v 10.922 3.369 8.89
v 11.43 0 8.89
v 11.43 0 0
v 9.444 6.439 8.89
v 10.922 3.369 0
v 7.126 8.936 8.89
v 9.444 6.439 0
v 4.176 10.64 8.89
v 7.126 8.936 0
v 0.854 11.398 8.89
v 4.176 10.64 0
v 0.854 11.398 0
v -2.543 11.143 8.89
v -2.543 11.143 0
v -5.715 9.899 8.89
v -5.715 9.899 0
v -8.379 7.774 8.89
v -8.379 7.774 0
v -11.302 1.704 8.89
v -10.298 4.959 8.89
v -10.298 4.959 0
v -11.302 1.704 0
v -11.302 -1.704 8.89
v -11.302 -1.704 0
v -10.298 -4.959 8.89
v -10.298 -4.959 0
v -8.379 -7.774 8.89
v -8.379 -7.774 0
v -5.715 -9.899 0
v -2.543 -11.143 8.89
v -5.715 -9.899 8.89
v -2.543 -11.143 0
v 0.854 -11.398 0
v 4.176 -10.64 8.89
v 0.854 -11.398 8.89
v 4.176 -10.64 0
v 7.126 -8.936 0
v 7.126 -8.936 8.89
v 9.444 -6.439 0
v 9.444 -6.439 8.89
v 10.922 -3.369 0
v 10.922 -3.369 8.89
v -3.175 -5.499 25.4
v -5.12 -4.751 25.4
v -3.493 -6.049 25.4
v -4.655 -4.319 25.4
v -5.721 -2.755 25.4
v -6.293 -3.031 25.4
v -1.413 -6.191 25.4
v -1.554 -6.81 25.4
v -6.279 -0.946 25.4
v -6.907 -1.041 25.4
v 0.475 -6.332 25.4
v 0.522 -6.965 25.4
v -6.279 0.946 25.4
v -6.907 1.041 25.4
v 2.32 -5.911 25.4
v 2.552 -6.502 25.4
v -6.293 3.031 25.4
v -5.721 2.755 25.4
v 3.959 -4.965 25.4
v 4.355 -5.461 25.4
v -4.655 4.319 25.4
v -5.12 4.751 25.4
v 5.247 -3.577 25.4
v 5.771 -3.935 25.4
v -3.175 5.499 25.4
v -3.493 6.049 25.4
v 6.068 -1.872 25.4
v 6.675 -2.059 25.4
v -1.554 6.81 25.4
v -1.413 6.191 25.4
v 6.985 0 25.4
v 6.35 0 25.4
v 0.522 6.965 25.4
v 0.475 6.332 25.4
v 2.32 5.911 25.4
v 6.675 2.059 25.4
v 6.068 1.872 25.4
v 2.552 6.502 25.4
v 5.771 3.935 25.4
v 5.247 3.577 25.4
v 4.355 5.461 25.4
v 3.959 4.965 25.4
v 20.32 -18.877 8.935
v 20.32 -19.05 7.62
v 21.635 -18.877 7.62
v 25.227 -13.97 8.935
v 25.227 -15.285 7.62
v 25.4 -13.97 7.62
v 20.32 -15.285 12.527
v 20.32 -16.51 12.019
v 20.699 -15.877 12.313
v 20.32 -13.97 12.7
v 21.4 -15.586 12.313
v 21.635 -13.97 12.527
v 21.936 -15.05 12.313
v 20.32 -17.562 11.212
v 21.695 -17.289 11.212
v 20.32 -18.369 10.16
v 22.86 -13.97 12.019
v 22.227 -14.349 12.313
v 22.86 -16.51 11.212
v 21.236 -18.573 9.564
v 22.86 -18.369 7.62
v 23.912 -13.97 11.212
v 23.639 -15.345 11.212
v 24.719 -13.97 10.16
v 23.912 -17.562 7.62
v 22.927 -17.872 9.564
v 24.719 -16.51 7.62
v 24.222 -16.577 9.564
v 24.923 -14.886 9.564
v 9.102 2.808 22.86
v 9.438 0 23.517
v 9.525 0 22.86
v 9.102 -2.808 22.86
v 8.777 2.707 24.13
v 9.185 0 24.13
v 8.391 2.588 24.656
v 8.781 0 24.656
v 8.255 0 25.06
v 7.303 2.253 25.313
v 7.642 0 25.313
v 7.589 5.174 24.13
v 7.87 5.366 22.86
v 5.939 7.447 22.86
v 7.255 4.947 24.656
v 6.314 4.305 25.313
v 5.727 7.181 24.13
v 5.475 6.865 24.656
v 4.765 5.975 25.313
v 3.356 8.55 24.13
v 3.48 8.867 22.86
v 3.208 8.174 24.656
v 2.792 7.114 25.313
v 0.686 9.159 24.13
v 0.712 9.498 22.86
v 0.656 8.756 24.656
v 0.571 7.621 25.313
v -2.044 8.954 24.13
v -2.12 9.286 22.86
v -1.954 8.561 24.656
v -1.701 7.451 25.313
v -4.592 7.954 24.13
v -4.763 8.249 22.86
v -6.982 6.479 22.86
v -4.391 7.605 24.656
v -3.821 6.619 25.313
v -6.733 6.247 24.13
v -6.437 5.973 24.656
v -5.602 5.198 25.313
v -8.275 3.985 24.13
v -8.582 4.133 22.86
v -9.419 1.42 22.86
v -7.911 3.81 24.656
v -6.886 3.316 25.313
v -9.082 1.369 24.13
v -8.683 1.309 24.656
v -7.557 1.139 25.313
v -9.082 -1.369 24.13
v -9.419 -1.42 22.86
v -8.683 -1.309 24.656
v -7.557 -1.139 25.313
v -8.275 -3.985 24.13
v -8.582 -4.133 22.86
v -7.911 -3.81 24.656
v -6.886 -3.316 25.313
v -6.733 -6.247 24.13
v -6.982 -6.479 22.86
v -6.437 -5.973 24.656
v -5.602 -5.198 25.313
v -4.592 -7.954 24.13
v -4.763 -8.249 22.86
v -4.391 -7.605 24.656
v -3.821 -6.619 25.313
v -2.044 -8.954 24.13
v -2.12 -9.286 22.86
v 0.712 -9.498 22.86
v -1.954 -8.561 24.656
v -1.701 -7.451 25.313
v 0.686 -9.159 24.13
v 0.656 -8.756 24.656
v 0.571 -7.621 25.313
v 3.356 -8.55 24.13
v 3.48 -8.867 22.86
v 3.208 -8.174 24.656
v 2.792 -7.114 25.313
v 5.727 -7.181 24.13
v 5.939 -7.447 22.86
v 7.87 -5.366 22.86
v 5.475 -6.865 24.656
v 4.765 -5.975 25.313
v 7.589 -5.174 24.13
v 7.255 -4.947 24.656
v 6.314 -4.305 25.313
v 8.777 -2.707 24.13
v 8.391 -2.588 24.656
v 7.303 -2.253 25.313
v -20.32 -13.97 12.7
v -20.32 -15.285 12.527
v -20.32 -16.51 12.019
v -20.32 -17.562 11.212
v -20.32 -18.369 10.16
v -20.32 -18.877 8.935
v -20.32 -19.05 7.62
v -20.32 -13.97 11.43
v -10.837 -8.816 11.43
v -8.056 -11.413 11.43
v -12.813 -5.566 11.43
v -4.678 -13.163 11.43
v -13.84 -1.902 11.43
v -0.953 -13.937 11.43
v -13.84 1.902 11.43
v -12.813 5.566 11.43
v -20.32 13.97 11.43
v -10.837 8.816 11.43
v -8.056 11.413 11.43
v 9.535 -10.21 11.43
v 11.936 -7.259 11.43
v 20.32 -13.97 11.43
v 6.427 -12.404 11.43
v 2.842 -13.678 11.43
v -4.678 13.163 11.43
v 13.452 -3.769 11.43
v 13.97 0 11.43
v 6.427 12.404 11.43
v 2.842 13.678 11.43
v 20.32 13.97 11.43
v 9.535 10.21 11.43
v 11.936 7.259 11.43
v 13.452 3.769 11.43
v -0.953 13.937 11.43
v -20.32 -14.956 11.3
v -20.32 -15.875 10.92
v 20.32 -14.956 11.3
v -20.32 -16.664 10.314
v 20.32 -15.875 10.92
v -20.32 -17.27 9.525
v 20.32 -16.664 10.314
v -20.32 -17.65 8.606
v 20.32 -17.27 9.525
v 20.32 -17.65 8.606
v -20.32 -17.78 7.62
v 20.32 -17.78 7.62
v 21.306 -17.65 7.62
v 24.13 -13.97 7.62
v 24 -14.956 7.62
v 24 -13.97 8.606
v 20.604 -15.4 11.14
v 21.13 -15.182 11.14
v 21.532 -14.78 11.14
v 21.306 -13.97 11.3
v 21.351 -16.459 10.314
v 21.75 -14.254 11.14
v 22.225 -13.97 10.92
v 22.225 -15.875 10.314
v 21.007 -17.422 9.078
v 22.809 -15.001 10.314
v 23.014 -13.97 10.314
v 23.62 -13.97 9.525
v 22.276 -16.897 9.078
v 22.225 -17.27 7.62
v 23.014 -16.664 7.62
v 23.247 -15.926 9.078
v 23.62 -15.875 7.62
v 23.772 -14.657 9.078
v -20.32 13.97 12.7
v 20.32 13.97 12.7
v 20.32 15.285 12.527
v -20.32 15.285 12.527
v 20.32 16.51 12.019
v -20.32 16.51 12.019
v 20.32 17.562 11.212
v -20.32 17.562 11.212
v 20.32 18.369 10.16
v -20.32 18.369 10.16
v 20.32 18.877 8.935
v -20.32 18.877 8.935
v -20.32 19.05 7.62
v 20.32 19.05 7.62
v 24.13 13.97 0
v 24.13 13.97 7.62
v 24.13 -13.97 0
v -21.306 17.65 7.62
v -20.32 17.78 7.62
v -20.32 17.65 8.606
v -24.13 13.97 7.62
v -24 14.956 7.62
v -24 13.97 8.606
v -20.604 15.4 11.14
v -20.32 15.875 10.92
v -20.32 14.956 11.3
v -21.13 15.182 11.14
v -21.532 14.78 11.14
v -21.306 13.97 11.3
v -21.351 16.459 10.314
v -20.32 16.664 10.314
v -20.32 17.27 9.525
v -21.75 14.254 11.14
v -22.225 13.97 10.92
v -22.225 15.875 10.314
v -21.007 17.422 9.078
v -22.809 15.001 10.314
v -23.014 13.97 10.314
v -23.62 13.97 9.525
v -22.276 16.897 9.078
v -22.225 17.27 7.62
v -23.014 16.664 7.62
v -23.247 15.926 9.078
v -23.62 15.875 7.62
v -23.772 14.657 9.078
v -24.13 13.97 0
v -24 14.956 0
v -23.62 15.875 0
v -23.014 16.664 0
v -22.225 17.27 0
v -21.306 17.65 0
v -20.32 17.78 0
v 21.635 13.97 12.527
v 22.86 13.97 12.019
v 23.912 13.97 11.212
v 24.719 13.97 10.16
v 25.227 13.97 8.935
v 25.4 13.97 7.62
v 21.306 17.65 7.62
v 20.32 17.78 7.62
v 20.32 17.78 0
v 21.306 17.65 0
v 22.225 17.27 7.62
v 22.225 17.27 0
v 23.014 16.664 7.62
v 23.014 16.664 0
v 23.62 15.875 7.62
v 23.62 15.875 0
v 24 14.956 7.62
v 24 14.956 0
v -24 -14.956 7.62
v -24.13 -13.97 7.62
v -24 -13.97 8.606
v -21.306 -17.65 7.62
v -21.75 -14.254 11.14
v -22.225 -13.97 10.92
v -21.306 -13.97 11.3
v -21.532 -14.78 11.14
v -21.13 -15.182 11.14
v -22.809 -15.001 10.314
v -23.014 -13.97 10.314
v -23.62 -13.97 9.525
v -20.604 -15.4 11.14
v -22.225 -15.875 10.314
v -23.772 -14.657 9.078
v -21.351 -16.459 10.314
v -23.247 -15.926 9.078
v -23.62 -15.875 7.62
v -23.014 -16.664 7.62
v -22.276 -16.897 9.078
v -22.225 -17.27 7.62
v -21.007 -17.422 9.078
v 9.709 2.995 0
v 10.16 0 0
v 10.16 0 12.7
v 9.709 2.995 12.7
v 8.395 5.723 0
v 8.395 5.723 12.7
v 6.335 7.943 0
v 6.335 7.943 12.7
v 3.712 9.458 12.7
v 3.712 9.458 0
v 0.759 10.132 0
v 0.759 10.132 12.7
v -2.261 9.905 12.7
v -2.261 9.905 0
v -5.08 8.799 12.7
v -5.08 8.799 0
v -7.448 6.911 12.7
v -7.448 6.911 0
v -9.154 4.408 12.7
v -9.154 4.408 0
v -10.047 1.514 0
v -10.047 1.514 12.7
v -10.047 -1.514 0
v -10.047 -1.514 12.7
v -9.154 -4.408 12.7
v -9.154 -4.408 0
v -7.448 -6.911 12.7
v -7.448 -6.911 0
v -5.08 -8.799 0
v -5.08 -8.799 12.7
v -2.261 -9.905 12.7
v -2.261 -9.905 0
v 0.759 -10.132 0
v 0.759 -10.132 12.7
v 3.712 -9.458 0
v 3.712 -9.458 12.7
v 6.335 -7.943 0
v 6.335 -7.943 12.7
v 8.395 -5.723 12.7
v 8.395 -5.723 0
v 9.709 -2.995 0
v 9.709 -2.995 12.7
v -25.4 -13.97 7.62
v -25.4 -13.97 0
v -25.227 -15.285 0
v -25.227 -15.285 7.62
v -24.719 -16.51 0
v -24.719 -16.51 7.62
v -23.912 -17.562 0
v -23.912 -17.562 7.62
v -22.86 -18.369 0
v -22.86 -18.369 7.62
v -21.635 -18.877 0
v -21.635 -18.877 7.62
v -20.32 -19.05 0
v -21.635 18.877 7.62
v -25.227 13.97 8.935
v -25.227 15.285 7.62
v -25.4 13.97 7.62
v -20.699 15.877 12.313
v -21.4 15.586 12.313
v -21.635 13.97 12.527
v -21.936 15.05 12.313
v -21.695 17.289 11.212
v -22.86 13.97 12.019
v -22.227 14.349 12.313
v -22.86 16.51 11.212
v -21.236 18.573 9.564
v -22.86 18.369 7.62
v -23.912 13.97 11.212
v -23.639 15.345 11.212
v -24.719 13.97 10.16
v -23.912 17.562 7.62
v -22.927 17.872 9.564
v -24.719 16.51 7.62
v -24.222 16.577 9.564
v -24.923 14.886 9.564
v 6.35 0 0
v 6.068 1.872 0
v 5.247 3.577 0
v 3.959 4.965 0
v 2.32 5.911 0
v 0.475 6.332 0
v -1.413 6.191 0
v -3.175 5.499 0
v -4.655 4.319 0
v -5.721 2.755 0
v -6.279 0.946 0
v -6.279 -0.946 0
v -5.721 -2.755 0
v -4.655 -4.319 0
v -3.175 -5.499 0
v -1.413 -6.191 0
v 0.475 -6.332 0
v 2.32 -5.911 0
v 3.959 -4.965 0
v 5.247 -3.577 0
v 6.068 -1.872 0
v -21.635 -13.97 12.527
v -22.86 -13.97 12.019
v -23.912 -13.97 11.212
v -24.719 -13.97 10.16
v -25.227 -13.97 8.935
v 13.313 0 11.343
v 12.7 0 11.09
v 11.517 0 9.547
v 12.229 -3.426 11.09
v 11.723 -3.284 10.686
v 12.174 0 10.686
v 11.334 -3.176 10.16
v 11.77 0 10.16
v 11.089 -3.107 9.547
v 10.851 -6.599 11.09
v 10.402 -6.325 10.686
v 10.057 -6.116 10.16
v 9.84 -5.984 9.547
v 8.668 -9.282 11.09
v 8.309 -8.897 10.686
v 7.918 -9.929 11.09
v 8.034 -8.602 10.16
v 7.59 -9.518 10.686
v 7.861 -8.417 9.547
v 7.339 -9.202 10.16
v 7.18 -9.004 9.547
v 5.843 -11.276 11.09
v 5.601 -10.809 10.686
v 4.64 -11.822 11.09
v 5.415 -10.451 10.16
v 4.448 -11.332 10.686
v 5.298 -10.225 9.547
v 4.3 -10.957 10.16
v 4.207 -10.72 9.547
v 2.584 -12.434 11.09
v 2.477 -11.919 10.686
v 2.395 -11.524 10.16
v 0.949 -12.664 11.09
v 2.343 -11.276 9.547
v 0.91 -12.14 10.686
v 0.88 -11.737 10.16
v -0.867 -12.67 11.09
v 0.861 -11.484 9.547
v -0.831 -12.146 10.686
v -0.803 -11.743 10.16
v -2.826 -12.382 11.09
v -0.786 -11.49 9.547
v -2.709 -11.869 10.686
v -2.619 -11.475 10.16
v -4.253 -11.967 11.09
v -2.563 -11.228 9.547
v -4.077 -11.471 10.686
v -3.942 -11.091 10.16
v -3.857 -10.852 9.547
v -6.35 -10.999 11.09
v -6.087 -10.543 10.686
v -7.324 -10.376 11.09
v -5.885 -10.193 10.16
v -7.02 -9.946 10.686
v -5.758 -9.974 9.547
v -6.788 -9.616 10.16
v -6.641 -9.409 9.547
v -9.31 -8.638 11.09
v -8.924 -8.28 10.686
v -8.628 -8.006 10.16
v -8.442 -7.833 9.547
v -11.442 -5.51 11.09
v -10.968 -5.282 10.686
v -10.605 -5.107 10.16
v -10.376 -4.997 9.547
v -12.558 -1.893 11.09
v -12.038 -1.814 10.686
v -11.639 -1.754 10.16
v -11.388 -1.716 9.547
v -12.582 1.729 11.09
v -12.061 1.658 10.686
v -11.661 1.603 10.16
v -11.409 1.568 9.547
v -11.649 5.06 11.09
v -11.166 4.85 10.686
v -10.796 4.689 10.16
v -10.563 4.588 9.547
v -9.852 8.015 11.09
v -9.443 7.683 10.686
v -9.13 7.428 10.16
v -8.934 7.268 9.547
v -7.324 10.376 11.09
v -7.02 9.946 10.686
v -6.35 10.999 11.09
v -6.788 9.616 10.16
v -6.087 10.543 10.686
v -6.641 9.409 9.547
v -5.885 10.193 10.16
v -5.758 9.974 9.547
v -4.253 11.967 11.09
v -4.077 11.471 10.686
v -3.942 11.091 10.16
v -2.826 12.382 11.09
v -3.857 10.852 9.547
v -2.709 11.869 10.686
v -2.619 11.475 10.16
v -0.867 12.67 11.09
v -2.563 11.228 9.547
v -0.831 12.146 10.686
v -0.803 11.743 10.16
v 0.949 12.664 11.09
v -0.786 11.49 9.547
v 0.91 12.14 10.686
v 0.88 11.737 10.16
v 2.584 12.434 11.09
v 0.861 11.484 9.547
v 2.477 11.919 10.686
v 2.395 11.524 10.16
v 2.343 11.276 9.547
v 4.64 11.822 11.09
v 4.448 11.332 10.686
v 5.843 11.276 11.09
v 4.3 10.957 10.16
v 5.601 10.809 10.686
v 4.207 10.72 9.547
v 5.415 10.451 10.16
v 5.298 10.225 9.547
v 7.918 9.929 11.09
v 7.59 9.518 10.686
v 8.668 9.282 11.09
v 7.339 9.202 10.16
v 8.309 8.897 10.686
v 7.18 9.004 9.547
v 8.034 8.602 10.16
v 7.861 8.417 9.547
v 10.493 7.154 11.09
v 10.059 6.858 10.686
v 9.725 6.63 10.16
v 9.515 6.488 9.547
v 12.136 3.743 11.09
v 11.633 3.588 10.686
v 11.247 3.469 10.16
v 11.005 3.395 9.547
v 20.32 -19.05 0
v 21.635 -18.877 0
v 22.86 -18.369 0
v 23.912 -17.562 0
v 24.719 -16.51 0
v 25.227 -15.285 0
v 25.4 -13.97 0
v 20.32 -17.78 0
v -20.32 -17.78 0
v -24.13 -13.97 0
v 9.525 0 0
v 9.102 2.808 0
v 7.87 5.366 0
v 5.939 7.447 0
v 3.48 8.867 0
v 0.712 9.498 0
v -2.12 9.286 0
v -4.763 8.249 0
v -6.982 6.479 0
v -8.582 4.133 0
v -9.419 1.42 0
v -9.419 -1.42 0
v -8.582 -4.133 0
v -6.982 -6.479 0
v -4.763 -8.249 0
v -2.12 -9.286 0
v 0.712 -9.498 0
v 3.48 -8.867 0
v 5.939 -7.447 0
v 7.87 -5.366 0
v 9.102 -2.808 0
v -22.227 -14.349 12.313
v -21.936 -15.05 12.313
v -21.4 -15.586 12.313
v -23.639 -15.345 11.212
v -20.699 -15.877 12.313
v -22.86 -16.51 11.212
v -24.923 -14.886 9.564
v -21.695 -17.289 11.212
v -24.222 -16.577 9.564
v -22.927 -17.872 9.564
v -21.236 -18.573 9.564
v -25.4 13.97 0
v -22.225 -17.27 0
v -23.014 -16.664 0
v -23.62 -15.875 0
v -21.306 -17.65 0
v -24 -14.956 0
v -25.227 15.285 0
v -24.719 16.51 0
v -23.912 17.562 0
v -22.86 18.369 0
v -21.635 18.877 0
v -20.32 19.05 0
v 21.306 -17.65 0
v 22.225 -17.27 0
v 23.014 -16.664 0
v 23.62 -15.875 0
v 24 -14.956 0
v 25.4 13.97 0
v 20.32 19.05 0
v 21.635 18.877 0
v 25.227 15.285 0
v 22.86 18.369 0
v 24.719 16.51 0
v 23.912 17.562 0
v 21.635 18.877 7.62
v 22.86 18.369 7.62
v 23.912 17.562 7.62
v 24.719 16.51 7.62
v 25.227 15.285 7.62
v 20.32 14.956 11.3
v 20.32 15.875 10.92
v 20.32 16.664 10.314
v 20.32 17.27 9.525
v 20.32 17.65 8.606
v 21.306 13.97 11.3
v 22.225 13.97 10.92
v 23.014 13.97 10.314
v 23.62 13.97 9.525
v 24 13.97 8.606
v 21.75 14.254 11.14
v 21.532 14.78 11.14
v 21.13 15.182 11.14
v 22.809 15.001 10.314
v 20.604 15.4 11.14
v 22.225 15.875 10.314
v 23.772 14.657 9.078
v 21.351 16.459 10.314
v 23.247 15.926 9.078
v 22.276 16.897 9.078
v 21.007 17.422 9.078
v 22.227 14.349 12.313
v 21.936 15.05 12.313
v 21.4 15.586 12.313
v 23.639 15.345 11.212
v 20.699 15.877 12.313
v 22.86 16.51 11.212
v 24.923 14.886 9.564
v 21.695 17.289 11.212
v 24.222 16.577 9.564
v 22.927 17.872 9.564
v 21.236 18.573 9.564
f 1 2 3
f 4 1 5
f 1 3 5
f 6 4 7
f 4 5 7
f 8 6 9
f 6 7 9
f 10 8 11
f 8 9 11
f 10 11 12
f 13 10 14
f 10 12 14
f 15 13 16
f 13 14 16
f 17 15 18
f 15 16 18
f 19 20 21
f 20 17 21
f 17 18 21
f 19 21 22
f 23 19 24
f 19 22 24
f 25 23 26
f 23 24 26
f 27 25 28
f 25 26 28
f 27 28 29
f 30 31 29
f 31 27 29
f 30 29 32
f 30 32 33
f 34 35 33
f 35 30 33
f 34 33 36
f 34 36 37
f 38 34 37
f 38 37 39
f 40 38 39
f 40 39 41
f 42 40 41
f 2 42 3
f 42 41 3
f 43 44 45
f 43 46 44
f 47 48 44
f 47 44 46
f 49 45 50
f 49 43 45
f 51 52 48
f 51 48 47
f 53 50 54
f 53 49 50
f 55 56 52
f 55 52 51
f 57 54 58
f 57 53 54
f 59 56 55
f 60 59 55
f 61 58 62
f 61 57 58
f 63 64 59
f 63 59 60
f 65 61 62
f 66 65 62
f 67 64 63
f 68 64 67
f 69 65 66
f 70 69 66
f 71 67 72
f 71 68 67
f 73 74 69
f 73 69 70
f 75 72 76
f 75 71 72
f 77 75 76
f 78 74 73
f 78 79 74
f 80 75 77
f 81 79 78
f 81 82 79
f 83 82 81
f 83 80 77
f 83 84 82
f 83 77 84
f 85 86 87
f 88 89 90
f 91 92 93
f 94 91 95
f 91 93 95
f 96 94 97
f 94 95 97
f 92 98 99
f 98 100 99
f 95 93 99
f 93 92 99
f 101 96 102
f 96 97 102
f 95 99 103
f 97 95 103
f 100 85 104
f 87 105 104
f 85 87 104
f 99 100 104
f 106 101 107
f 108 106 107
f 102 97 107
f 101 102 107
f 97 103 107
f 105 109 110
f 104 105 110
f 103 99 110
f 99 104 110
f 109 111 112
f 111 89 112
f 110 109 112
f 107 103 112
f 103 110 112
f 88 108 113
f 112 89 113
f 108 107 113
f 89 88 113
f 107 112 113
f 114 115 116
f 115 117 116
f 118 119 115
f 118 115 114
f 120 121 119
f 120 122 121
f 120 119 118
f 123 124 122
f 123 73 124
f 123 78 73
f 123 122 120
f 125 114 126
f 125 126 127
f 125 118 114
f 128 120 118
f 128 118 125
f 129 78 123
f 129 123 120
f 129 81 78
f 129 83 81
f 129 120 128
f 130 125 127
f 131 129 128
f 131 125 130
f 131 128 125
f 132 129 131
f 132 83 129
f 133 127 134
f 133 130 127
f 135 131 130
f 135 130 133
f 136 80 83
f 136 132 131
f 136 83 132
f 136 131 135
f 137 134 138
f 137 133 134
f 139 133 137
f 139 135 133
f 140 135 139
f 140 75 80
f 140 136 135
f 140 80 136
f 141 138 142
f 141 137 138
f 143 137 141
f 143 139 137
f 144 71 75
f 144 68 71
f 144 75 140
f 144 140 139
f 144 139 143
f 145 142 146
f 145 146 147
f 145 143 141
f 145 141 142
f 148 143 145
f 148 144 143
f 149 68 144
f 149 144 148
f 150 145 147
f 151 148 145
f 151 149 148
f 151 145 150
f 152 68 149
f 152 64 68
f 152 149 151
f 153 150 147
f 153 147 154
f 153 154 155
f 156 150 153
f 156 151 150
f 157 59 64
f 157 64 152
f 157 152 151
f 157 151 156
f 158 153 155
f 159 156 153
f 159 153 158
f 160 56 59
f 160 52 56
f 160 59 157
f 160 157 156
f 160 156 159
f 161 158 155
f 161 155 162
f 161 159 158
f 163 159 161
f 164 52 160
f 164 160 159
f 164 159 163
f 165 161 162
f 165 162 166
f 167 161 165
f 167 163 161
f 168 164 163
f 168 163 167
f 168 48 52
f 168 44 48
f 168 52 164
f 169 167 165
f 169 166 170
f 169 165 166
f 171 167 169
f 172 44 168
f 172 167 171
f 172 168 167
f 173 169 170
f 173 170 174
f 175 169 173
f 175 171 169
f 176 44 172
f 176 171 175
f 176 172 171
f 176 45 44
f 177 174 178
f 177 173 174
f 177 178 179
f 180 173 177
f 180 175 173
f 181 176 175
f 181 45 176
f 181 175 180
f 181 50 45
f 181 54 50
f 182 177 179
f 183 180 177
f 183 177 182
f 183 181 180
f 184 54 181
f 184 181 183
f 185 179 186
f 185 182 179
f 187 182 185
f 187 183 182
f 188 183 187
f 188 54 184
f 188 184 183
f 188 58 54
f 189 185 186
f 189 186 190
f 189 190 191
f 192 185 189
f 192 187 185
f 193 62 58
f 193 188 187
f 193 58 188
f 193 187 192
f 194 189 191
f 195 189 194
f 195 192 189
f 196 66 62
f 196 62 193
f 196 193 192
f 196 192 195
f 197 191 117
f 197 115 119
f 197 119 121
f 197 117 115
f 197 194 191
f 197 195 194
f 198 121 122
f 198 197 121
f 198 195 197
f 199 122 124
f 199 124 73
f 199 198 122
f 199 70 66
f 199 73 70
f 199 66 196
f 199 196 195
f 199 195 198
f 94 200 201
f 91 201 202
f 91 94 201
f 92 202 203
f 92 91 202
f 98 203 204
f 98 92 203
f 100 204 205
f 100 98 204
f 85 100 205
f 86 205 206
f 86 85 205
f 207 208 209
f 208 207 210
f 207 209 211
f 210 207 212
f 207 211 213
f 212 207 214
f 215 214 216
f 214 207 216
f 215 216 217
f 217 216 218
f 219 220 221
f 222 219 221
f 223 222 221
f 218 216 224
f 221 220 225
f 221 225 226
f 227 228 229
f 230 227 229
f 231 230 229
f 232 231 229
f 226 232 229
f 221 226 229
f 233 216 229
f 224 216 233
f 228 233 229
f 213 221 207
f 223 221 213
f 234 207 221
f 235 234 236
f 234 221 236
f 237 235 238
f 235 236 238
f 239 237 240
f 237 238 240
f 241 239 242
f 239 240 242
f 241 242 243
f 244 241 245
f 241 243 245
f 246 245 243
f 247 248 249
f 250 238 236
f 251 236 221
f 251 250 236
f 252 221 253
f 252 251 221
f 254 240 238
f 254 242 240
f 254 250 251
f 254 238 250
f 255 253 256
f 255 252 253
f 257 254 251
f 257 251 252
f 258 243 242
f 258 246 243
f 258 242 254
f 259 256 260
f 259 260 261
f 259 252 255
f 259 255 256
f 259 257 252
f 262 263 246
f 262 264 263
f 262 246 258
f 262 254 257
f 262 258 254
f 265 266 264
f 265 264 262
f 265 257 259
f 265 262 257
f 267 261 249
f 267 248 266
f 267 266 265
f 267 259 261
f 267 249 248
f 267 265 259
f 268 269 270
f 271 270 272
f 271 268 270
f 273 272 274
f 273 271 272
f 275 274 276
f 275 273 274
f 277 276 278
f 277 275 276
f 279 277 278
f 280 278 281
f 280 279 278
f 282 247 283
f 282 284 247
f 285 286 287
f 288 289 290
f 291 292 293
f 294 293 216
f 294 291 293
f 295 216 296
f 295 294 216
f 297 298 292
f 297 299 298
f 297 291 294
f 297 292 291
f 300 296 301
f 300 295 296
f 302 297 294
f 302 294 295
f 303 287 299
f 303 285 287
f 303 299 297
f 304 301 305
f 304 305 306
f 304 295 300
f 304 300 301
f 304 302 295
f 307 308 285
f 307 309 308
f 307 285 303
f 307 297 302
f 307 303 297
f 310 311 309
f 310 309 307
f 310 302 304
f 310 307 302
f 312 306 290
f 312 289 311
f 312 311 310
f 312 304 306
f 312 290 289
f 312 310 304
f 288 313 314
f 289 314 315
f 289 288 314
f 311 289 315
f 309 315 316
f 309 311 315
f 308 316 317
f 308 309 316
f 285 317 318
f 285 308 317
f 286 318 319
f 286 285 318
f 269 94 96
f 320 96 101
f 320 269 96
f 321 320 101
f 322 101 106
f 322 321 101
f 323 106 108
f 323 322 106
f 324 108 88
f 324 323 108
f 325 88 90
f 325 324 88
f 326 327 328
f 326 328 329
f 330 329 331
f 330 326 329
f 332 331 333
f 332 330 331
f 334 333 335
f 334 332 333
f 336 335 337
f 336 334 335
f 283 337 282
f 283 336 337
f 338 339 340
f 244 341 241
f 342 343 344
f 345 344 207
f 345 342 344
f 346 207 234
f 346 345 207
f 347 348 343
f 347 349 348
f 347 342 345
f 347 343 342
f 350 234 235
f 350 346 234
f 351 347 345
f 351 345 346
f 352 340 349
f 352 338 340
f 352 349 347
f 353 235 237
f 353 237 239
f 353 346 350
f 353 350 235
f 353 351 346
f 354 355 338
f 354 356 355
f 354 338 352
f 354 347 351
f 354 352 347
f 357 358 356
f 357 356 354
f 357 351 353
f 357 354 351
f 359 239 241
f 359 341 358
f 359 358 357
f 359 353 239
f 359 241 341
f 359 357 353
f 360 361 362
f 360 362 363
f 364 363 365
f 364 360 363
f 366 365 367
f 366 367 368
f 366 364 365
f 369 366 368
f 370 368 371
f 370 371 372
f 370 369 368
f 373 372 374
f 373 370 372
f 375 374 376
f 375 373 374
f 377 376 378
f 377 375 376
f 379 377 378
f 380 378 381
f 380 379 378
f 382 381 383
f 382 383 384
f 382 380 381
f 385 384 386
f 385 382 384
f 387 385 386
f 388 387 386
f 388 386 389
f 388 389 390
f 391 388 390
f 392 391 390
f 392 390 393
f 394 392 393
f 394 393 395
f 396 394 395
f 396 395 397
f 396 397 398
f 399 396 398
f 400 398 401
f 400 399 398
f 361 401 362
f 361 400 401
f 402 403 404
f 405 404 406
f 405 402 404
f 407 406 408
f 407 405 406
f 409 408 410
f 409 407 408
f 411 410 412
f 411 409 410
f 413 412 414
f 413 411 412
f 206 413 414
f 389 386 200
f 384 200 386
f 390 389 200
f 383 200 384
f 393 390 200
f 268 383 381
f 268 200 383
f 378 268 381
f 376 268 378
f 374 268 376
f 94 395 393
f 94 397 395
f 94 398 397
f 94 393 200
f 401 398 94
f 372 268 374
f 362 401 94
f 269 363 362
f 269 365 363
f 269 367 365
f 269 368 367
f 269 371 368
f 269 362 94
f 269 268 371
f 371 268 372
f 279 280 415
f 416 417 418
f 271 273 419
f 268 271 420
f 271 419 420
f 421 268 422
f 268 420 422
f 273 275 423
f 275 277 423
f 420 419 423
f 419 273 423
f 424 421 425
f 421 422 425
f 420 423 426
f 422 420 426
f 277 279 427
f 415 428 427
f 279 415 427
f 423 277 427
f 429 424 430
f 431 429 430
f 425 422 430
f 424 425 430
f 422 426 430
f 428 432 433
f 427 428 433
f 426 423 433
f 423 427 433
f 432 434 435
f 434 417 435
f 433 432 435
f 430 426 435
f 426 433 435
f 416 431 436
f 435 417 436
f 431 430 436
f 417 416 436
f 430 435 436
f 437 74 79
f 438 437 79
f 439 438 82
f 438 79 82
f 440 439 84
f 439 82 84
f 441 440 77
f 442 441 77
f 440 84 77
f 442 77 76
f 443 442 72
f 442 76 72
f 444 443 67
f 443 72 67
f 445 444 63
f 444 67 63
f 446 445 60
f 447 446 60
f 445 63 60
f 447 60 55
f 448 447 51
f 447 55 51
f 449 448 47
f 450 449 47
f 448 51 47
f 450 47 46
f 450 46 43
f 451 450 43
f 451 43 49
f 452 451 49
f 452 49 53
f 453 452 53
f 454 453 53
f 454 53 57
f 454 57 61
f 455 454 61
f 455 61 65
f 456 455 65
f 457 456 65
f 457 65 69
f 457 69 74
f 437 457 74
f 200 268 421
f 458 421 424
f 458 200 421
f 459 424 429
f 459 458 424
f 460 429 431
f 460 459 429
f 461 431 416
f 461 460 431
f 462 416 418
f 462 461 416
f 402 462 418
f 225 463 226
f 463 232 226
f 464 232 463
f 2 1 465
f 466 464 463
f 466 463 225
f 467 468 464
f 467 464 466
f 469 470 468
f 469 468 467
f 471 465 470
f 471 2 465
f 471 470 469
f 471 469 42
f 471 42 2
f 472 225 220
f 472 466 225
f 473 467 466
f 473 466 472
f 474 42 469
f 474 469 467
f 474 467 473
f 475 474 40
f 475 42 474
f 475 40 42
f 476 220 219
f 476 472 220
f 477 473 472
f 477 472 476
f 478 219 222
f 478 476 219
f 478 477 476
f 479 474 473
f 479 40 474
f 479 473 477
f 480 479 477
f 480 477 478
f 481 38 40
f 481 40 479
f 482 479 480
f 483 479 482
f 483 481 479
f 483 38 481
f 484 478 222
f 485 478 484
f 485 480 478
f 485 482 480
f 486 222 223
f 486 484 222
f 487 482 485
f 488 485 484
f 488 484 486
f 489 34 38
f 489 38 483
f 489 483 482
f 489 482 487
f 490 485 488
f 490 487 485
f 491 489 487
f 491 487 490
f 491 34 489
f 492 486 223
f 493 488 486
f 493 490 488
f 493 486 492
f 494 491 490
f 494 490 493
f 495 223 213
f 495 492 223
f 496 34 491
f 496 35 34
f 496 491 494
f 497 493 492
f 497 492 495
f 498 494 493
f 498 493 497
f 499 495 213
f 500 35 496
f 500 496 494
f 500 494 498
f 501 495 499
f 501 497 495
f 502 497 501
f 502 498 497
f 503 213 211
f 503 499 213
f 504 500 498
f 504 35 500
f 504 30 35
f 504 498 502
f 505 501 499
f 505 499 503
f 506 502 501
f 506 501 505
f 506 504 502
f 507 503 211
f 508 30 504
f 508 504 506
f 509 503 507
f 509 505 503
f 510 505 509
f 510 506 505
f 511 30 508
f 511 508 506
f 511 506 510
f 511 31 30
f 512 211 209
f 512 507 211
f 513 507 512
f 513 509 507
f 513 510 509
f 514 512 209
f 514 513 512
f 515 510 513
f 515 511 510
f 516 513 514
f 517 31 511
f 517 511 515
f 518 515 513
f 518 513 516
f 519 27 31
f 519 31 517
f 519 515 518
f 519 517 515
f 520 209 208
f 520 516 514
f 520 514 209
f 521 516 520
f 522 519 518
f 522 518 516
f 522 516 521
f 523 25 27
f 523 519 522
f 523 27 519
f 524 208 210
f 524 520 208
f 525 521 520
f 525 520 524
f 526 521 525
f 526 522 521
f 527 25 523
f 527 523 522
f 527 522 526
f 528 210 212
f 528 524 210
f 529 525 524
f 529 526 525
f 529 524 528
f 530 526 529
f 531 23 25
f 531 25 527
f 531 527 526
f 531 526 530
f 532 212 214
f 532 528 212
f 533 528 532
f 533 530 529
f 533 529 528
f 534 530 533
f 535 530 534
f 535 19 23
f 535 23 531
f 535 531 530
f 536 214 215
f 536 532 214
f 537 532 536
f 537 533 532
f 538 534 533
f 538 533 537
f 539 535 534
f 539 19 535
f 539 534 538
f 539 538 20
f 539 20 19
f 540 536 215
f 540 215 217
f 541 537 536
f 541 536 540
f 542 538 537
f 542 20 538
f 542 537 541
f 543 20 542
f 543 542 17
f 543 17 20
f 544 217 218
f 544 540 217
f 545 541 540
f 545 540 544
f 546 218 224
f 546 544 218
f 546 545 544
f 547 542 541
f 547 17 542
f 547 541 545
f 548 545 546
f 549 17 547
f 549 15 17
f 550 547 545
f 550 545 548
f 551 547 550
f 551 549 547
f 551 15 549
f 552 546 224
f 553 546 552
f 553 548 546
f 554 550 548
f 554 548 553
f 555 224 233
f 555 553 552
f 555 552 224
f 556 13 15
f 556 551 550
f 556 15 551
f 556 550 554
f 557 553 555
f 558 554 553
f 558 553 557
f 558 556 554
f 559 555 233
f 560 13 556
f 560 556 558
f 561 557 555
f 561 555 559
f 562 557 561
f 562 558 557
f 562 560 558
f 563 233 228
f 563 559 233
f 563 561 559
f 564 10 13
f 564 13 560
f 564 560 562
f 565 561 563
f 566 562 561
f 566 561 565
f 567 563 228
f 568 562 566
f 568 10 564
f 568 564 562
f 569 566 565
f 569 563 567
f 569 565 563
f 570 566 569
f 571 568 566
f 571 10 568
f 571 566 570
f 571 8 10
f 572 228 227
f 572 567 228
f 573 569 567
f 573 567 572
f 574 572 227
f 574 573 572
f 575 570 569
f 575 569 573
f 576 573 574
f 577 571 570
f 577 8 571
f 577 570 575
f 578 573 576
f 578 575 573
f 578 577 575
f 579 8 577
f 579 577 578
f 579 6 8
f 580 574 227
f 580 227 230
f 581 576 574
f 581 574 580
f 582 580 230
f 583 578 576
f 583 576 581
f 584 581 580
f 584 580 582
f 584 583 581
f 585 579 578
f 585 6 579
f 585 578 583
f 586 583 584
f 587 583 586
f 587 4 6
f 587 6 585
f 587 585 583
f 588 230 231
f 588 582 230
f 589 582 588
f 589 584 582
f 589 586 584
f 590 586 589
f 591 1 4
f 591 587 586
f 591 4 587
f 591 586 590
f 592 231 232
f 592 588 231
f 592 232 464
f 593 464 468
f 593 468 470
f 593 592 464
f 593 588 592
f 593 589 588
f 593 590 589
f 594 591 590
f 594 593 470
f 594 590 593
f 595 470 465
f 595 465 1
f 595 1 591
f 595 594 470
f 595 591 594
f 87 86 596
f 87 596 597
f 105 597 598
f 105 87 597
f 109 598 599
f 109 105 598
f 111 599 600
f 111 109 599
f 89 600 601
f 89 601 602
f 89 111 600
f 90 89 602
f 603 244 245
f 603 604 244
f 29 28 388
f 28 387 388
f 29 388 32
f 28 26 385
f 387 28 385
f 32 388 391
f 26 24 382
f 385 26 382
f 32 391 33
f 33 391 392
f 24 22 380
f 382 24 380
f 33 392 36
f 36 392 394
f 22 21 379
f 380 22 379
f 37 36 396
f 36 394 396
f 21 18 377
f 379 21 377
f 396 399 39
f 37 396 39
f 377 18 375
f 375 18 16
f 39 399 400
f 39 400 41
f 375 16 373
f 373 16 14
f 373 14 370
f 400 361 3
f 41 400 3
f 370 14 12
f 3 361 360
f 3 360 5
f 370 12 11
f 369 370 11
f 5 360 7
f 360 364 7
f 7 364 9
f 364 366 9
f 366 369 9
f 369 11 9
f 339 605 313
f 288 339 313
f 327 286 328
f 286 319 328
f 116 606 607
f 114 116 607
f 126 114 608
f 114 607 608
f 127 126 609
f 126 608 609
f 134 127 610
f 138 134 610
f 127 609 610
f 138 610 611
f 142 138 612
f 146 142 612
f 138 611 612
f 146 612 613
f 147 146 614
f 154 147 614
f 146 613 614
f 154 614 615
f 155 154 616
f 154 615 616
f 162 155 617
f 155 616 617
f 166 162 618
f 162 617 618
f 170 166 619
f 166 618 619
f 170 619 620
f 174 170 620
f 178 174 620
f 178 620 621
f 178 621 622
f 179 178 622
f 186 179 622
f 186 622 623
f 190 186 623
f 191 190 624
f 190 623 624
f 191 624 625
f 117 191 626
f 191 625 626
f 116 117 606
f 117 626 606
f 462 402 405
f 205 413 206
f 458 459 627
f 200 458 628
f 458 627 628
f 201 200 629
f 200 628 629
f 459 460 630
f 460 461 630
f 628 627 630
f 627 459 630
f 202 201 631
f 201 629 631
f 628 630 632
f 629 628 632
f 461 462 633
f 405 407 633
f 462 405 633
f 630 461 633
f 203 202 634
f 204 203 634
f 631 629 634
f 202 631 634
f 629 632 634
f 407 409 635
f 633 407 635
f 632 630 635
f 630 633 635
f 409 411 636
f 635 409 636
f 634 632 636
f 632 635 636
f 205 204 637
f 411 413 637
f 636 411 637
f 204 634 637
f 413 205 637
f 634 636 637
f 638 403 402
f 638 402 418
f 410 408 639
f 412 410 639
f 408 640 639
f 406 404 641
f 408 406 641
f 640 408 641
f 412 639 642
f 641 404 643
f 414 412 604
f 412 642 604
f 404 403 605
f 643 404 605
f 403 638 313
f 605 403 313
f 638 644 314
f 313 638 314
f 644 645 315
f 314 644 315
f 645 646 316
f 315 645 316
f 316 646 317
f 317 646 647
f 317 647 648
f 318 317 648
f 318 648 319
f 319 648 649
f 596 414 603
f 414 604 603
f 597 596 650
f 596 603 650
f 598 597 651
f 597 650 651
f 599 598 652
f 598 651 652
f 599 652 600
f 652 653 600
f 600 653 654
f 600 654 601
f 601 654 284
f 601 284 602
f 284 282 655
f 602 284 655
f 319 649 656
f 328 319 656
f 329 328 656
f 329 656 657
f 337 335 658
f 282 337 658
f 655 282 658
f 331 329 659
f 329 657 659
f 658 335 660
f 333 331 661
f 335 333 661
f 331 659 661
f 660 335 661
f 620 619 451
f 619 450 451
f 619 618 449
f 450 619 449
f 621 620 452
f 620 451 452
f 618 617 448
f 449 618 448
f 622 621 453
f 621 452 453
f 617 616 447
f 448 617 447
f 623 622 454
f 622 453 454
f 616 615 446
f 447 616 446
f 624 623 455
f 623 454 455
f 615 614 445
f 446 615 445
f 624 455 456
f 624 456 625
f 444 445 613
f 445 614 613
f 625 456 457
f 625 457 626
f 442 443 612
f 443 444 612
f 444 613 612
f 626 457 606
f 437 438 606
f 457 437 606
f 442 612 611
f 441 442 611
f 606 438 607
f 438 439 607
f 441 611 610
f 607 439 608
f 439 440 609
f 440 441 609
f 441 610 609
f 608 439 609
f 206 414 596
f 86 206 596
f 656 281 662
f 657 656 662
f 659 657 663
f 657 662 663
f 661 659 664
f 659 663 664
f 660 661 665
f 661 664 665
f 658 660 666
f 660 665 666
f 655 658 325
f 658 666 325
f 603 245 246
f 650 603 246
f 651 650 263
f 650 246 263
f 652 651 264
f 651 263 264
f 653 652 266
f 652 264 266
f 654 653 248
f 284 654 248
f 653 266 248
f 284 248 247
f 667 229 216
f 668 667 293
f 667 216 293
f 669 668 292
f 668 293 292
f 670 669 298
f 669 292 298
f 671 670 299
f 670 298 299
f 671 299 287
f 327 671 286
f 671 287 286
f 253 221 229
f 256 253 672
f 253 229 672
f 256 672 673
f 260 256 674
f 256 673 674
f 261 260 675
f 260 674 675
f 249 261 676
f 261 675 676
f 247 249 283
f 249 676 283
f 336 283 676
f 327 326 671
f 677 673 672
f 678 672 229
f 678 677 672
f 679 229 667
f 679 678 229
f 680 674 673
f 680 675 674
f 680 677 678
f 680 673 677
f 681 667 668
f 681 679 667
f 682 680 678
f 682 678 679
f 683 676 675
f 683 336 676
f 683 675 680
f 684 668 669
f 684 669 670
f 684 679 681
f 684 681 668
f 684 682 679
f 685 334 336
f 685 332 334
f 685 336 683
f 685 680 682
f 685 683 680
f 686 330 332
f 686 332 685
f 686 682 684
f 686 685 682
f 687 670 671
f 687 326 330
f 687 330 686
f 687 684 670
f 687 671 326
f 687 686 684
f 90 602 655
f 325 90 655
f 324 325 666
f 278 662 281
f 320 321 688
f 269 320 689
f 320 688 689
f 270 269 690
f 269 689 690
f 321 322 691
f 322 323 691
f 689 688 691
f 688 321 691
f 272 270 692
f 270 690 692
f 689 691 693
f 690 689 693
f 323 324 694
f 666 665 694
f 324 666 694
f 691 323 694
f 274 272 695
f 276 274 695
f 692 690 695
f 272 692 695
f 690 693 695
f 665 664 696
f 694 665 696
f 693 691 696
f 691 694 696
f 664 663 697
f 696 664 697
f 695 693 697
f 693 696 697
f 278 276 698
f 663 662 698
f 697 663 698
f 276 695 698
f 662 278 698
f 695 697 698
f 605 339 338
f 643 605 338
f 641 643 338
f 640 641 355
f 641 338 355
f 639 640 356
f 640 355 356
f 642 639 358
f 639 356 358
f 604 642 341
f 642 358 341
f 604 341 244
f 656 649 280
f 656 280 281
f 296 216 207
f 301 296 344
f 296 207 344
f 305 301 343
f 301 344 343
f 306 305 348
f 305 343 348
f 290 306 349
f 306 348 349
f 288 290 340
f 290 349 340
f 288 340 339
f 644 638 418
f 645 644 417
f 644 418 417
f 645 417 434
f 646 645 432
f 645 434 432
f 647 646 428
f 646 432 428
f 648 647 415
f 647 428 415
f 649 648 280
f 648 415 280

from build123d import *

# Parameters (mm, degrees)
F0_W     = 50.8
F0_H     = 38.1
F0_R     = 10.16
F1_DEPTH = 12.7
F0_R_2   = 9.525
F2_DEPTH = 25.4
F3_R     = 5.08
F4_R     = 2.54
F5_R     = 5.08
F6_T     = -1.27
F7_R     = 2.54
F8_R     = 6.35
F9_DEPTH = 25.401


with BuildPart() as f1:
    # F0 (on Top) → F1 (new body)
    with BuildSketch(Plane.XY):
        Rectangle(F0_W, F0_H)
        Circle(F0_R, mode=Mode.SUBTRACT)
    extrude(amount=F1_DEPTH)

    # F3
    f3_edges = [f1.edges().sort_by_distance(p)[0] for p in [
        (25.4, -19.05, 6.35),
        (25.4, 19.05, 6.35),
        (-25.4, -19.05, 6.35),
        (-25.4, 19.05, 6.35),
    ]]
    fillet(f3_edges, radius=F3_R)

    # F5
    f5_edges = [f1.edges().sort_by_distance(p)[0] for p in [
        (25.4, 0, 12.7),
    ]]
    fillet(f5_edges, radius=F5_R)

    # F6
    f6_openings = [f1.faces().sort_by_distance(p)[0] for p in [
        (0, -18.415, 0),
    ]]
    offset(amount=F6_T, openings=f6_openings)

    # F7
    f7_edges = [f1.edges().sort_by_distance(p)[0] for p in [
        (-11.43, 0, 11.43),
    ]]
    fillet(f7_edges, radius=F7_R)


with BuildPart() as f2:
    # F0 (on Top) → F2 (new body)
    with BuildSketch(Plane.XY):
        Circle(F0_R_2)
    extrude(amount=F2_DEPTH)

    # F4
    f4_edges = [f2.edges().sort_by_distance(p)[0] for p in [
        (-9.525, 0, 25.4),
    ]]
    fillet(f4_edges, radius=F4_R)

    # F8 (on face) → F9 (cut, through all)
    with BuildSketch(Plane.XY.offset(25.4)):
        Circle(F8_R)
    extrude(amount=-F9_DEPTH, mode=Mode.SUBTRACT)


solid = Compound([f1.part, f2.part])
